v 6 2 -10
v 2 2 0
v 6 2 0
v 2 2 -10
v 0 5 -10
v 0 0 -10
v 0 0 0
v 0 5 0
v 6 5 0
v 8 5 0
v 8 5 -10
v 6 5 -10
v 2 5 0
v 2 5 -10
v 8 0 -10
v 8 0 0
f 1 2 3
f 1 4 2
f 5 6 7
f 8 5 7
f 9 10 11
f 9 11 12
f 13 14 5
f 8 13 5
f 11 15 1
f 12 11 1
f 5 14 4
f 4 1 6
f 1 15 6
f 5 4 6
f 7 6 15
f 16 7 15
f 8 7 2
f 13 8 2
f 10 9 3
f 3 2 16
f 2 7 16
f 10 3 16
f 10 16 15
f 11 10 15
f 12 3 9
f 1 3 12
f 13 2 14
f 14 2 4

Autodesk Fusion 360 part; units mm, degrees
sketch "Sketch1" plane through (0, 0, 0) normal (0, 1, 0) x (1, 0, 0)
  line L0 (0, 0) -> (8, 0)
  line L1 (8, 0) -> (8, 10)
  line L2 (8, 10) -> (0, 10)
  line L3 (0, 10) -> (0, 0)
  dimension "d1" = 8
  dimension "d2" = 10
extrude "Extrude1" add sketch "Sketch1" along normal blind 2
sketch "Sketch3" plane through (0, 2, 0) normal (0, 1, 0) x (-1, 0, 0)
  line L0 (0, -10) -> (0, 0)
  line L1 (0, 0) -> (-8, 0)
  line L2 (-8, 0) -> (-8, -10)
  line L3 (-8, -10) -> (0, -10)
  line L4 (0, 0) -> (-2, 0)
  line L5 (-2, 0) -> (-2, -10)
  line L6 (-2, -10) -> (0, -10)
  line L7 (0, -10) -> (0, 0)
  line L8 (-8, 0) -> (-6, 0)
  line L9 (-6, 0) -> (-6, -10)
  line L10 (-6, -10) -> (-8, -10)
  line L11 (-8, -10) -> (-8, 0)
  dimension "d5" = 2
  dimension "d6" = 2
extrude "Extrude2" add sketch "Sketch3" along normal blind 3 contours L0 L1 L3 L4 L5 L6 L7 | L1 L2 L3 L8 L9 L10 L11
